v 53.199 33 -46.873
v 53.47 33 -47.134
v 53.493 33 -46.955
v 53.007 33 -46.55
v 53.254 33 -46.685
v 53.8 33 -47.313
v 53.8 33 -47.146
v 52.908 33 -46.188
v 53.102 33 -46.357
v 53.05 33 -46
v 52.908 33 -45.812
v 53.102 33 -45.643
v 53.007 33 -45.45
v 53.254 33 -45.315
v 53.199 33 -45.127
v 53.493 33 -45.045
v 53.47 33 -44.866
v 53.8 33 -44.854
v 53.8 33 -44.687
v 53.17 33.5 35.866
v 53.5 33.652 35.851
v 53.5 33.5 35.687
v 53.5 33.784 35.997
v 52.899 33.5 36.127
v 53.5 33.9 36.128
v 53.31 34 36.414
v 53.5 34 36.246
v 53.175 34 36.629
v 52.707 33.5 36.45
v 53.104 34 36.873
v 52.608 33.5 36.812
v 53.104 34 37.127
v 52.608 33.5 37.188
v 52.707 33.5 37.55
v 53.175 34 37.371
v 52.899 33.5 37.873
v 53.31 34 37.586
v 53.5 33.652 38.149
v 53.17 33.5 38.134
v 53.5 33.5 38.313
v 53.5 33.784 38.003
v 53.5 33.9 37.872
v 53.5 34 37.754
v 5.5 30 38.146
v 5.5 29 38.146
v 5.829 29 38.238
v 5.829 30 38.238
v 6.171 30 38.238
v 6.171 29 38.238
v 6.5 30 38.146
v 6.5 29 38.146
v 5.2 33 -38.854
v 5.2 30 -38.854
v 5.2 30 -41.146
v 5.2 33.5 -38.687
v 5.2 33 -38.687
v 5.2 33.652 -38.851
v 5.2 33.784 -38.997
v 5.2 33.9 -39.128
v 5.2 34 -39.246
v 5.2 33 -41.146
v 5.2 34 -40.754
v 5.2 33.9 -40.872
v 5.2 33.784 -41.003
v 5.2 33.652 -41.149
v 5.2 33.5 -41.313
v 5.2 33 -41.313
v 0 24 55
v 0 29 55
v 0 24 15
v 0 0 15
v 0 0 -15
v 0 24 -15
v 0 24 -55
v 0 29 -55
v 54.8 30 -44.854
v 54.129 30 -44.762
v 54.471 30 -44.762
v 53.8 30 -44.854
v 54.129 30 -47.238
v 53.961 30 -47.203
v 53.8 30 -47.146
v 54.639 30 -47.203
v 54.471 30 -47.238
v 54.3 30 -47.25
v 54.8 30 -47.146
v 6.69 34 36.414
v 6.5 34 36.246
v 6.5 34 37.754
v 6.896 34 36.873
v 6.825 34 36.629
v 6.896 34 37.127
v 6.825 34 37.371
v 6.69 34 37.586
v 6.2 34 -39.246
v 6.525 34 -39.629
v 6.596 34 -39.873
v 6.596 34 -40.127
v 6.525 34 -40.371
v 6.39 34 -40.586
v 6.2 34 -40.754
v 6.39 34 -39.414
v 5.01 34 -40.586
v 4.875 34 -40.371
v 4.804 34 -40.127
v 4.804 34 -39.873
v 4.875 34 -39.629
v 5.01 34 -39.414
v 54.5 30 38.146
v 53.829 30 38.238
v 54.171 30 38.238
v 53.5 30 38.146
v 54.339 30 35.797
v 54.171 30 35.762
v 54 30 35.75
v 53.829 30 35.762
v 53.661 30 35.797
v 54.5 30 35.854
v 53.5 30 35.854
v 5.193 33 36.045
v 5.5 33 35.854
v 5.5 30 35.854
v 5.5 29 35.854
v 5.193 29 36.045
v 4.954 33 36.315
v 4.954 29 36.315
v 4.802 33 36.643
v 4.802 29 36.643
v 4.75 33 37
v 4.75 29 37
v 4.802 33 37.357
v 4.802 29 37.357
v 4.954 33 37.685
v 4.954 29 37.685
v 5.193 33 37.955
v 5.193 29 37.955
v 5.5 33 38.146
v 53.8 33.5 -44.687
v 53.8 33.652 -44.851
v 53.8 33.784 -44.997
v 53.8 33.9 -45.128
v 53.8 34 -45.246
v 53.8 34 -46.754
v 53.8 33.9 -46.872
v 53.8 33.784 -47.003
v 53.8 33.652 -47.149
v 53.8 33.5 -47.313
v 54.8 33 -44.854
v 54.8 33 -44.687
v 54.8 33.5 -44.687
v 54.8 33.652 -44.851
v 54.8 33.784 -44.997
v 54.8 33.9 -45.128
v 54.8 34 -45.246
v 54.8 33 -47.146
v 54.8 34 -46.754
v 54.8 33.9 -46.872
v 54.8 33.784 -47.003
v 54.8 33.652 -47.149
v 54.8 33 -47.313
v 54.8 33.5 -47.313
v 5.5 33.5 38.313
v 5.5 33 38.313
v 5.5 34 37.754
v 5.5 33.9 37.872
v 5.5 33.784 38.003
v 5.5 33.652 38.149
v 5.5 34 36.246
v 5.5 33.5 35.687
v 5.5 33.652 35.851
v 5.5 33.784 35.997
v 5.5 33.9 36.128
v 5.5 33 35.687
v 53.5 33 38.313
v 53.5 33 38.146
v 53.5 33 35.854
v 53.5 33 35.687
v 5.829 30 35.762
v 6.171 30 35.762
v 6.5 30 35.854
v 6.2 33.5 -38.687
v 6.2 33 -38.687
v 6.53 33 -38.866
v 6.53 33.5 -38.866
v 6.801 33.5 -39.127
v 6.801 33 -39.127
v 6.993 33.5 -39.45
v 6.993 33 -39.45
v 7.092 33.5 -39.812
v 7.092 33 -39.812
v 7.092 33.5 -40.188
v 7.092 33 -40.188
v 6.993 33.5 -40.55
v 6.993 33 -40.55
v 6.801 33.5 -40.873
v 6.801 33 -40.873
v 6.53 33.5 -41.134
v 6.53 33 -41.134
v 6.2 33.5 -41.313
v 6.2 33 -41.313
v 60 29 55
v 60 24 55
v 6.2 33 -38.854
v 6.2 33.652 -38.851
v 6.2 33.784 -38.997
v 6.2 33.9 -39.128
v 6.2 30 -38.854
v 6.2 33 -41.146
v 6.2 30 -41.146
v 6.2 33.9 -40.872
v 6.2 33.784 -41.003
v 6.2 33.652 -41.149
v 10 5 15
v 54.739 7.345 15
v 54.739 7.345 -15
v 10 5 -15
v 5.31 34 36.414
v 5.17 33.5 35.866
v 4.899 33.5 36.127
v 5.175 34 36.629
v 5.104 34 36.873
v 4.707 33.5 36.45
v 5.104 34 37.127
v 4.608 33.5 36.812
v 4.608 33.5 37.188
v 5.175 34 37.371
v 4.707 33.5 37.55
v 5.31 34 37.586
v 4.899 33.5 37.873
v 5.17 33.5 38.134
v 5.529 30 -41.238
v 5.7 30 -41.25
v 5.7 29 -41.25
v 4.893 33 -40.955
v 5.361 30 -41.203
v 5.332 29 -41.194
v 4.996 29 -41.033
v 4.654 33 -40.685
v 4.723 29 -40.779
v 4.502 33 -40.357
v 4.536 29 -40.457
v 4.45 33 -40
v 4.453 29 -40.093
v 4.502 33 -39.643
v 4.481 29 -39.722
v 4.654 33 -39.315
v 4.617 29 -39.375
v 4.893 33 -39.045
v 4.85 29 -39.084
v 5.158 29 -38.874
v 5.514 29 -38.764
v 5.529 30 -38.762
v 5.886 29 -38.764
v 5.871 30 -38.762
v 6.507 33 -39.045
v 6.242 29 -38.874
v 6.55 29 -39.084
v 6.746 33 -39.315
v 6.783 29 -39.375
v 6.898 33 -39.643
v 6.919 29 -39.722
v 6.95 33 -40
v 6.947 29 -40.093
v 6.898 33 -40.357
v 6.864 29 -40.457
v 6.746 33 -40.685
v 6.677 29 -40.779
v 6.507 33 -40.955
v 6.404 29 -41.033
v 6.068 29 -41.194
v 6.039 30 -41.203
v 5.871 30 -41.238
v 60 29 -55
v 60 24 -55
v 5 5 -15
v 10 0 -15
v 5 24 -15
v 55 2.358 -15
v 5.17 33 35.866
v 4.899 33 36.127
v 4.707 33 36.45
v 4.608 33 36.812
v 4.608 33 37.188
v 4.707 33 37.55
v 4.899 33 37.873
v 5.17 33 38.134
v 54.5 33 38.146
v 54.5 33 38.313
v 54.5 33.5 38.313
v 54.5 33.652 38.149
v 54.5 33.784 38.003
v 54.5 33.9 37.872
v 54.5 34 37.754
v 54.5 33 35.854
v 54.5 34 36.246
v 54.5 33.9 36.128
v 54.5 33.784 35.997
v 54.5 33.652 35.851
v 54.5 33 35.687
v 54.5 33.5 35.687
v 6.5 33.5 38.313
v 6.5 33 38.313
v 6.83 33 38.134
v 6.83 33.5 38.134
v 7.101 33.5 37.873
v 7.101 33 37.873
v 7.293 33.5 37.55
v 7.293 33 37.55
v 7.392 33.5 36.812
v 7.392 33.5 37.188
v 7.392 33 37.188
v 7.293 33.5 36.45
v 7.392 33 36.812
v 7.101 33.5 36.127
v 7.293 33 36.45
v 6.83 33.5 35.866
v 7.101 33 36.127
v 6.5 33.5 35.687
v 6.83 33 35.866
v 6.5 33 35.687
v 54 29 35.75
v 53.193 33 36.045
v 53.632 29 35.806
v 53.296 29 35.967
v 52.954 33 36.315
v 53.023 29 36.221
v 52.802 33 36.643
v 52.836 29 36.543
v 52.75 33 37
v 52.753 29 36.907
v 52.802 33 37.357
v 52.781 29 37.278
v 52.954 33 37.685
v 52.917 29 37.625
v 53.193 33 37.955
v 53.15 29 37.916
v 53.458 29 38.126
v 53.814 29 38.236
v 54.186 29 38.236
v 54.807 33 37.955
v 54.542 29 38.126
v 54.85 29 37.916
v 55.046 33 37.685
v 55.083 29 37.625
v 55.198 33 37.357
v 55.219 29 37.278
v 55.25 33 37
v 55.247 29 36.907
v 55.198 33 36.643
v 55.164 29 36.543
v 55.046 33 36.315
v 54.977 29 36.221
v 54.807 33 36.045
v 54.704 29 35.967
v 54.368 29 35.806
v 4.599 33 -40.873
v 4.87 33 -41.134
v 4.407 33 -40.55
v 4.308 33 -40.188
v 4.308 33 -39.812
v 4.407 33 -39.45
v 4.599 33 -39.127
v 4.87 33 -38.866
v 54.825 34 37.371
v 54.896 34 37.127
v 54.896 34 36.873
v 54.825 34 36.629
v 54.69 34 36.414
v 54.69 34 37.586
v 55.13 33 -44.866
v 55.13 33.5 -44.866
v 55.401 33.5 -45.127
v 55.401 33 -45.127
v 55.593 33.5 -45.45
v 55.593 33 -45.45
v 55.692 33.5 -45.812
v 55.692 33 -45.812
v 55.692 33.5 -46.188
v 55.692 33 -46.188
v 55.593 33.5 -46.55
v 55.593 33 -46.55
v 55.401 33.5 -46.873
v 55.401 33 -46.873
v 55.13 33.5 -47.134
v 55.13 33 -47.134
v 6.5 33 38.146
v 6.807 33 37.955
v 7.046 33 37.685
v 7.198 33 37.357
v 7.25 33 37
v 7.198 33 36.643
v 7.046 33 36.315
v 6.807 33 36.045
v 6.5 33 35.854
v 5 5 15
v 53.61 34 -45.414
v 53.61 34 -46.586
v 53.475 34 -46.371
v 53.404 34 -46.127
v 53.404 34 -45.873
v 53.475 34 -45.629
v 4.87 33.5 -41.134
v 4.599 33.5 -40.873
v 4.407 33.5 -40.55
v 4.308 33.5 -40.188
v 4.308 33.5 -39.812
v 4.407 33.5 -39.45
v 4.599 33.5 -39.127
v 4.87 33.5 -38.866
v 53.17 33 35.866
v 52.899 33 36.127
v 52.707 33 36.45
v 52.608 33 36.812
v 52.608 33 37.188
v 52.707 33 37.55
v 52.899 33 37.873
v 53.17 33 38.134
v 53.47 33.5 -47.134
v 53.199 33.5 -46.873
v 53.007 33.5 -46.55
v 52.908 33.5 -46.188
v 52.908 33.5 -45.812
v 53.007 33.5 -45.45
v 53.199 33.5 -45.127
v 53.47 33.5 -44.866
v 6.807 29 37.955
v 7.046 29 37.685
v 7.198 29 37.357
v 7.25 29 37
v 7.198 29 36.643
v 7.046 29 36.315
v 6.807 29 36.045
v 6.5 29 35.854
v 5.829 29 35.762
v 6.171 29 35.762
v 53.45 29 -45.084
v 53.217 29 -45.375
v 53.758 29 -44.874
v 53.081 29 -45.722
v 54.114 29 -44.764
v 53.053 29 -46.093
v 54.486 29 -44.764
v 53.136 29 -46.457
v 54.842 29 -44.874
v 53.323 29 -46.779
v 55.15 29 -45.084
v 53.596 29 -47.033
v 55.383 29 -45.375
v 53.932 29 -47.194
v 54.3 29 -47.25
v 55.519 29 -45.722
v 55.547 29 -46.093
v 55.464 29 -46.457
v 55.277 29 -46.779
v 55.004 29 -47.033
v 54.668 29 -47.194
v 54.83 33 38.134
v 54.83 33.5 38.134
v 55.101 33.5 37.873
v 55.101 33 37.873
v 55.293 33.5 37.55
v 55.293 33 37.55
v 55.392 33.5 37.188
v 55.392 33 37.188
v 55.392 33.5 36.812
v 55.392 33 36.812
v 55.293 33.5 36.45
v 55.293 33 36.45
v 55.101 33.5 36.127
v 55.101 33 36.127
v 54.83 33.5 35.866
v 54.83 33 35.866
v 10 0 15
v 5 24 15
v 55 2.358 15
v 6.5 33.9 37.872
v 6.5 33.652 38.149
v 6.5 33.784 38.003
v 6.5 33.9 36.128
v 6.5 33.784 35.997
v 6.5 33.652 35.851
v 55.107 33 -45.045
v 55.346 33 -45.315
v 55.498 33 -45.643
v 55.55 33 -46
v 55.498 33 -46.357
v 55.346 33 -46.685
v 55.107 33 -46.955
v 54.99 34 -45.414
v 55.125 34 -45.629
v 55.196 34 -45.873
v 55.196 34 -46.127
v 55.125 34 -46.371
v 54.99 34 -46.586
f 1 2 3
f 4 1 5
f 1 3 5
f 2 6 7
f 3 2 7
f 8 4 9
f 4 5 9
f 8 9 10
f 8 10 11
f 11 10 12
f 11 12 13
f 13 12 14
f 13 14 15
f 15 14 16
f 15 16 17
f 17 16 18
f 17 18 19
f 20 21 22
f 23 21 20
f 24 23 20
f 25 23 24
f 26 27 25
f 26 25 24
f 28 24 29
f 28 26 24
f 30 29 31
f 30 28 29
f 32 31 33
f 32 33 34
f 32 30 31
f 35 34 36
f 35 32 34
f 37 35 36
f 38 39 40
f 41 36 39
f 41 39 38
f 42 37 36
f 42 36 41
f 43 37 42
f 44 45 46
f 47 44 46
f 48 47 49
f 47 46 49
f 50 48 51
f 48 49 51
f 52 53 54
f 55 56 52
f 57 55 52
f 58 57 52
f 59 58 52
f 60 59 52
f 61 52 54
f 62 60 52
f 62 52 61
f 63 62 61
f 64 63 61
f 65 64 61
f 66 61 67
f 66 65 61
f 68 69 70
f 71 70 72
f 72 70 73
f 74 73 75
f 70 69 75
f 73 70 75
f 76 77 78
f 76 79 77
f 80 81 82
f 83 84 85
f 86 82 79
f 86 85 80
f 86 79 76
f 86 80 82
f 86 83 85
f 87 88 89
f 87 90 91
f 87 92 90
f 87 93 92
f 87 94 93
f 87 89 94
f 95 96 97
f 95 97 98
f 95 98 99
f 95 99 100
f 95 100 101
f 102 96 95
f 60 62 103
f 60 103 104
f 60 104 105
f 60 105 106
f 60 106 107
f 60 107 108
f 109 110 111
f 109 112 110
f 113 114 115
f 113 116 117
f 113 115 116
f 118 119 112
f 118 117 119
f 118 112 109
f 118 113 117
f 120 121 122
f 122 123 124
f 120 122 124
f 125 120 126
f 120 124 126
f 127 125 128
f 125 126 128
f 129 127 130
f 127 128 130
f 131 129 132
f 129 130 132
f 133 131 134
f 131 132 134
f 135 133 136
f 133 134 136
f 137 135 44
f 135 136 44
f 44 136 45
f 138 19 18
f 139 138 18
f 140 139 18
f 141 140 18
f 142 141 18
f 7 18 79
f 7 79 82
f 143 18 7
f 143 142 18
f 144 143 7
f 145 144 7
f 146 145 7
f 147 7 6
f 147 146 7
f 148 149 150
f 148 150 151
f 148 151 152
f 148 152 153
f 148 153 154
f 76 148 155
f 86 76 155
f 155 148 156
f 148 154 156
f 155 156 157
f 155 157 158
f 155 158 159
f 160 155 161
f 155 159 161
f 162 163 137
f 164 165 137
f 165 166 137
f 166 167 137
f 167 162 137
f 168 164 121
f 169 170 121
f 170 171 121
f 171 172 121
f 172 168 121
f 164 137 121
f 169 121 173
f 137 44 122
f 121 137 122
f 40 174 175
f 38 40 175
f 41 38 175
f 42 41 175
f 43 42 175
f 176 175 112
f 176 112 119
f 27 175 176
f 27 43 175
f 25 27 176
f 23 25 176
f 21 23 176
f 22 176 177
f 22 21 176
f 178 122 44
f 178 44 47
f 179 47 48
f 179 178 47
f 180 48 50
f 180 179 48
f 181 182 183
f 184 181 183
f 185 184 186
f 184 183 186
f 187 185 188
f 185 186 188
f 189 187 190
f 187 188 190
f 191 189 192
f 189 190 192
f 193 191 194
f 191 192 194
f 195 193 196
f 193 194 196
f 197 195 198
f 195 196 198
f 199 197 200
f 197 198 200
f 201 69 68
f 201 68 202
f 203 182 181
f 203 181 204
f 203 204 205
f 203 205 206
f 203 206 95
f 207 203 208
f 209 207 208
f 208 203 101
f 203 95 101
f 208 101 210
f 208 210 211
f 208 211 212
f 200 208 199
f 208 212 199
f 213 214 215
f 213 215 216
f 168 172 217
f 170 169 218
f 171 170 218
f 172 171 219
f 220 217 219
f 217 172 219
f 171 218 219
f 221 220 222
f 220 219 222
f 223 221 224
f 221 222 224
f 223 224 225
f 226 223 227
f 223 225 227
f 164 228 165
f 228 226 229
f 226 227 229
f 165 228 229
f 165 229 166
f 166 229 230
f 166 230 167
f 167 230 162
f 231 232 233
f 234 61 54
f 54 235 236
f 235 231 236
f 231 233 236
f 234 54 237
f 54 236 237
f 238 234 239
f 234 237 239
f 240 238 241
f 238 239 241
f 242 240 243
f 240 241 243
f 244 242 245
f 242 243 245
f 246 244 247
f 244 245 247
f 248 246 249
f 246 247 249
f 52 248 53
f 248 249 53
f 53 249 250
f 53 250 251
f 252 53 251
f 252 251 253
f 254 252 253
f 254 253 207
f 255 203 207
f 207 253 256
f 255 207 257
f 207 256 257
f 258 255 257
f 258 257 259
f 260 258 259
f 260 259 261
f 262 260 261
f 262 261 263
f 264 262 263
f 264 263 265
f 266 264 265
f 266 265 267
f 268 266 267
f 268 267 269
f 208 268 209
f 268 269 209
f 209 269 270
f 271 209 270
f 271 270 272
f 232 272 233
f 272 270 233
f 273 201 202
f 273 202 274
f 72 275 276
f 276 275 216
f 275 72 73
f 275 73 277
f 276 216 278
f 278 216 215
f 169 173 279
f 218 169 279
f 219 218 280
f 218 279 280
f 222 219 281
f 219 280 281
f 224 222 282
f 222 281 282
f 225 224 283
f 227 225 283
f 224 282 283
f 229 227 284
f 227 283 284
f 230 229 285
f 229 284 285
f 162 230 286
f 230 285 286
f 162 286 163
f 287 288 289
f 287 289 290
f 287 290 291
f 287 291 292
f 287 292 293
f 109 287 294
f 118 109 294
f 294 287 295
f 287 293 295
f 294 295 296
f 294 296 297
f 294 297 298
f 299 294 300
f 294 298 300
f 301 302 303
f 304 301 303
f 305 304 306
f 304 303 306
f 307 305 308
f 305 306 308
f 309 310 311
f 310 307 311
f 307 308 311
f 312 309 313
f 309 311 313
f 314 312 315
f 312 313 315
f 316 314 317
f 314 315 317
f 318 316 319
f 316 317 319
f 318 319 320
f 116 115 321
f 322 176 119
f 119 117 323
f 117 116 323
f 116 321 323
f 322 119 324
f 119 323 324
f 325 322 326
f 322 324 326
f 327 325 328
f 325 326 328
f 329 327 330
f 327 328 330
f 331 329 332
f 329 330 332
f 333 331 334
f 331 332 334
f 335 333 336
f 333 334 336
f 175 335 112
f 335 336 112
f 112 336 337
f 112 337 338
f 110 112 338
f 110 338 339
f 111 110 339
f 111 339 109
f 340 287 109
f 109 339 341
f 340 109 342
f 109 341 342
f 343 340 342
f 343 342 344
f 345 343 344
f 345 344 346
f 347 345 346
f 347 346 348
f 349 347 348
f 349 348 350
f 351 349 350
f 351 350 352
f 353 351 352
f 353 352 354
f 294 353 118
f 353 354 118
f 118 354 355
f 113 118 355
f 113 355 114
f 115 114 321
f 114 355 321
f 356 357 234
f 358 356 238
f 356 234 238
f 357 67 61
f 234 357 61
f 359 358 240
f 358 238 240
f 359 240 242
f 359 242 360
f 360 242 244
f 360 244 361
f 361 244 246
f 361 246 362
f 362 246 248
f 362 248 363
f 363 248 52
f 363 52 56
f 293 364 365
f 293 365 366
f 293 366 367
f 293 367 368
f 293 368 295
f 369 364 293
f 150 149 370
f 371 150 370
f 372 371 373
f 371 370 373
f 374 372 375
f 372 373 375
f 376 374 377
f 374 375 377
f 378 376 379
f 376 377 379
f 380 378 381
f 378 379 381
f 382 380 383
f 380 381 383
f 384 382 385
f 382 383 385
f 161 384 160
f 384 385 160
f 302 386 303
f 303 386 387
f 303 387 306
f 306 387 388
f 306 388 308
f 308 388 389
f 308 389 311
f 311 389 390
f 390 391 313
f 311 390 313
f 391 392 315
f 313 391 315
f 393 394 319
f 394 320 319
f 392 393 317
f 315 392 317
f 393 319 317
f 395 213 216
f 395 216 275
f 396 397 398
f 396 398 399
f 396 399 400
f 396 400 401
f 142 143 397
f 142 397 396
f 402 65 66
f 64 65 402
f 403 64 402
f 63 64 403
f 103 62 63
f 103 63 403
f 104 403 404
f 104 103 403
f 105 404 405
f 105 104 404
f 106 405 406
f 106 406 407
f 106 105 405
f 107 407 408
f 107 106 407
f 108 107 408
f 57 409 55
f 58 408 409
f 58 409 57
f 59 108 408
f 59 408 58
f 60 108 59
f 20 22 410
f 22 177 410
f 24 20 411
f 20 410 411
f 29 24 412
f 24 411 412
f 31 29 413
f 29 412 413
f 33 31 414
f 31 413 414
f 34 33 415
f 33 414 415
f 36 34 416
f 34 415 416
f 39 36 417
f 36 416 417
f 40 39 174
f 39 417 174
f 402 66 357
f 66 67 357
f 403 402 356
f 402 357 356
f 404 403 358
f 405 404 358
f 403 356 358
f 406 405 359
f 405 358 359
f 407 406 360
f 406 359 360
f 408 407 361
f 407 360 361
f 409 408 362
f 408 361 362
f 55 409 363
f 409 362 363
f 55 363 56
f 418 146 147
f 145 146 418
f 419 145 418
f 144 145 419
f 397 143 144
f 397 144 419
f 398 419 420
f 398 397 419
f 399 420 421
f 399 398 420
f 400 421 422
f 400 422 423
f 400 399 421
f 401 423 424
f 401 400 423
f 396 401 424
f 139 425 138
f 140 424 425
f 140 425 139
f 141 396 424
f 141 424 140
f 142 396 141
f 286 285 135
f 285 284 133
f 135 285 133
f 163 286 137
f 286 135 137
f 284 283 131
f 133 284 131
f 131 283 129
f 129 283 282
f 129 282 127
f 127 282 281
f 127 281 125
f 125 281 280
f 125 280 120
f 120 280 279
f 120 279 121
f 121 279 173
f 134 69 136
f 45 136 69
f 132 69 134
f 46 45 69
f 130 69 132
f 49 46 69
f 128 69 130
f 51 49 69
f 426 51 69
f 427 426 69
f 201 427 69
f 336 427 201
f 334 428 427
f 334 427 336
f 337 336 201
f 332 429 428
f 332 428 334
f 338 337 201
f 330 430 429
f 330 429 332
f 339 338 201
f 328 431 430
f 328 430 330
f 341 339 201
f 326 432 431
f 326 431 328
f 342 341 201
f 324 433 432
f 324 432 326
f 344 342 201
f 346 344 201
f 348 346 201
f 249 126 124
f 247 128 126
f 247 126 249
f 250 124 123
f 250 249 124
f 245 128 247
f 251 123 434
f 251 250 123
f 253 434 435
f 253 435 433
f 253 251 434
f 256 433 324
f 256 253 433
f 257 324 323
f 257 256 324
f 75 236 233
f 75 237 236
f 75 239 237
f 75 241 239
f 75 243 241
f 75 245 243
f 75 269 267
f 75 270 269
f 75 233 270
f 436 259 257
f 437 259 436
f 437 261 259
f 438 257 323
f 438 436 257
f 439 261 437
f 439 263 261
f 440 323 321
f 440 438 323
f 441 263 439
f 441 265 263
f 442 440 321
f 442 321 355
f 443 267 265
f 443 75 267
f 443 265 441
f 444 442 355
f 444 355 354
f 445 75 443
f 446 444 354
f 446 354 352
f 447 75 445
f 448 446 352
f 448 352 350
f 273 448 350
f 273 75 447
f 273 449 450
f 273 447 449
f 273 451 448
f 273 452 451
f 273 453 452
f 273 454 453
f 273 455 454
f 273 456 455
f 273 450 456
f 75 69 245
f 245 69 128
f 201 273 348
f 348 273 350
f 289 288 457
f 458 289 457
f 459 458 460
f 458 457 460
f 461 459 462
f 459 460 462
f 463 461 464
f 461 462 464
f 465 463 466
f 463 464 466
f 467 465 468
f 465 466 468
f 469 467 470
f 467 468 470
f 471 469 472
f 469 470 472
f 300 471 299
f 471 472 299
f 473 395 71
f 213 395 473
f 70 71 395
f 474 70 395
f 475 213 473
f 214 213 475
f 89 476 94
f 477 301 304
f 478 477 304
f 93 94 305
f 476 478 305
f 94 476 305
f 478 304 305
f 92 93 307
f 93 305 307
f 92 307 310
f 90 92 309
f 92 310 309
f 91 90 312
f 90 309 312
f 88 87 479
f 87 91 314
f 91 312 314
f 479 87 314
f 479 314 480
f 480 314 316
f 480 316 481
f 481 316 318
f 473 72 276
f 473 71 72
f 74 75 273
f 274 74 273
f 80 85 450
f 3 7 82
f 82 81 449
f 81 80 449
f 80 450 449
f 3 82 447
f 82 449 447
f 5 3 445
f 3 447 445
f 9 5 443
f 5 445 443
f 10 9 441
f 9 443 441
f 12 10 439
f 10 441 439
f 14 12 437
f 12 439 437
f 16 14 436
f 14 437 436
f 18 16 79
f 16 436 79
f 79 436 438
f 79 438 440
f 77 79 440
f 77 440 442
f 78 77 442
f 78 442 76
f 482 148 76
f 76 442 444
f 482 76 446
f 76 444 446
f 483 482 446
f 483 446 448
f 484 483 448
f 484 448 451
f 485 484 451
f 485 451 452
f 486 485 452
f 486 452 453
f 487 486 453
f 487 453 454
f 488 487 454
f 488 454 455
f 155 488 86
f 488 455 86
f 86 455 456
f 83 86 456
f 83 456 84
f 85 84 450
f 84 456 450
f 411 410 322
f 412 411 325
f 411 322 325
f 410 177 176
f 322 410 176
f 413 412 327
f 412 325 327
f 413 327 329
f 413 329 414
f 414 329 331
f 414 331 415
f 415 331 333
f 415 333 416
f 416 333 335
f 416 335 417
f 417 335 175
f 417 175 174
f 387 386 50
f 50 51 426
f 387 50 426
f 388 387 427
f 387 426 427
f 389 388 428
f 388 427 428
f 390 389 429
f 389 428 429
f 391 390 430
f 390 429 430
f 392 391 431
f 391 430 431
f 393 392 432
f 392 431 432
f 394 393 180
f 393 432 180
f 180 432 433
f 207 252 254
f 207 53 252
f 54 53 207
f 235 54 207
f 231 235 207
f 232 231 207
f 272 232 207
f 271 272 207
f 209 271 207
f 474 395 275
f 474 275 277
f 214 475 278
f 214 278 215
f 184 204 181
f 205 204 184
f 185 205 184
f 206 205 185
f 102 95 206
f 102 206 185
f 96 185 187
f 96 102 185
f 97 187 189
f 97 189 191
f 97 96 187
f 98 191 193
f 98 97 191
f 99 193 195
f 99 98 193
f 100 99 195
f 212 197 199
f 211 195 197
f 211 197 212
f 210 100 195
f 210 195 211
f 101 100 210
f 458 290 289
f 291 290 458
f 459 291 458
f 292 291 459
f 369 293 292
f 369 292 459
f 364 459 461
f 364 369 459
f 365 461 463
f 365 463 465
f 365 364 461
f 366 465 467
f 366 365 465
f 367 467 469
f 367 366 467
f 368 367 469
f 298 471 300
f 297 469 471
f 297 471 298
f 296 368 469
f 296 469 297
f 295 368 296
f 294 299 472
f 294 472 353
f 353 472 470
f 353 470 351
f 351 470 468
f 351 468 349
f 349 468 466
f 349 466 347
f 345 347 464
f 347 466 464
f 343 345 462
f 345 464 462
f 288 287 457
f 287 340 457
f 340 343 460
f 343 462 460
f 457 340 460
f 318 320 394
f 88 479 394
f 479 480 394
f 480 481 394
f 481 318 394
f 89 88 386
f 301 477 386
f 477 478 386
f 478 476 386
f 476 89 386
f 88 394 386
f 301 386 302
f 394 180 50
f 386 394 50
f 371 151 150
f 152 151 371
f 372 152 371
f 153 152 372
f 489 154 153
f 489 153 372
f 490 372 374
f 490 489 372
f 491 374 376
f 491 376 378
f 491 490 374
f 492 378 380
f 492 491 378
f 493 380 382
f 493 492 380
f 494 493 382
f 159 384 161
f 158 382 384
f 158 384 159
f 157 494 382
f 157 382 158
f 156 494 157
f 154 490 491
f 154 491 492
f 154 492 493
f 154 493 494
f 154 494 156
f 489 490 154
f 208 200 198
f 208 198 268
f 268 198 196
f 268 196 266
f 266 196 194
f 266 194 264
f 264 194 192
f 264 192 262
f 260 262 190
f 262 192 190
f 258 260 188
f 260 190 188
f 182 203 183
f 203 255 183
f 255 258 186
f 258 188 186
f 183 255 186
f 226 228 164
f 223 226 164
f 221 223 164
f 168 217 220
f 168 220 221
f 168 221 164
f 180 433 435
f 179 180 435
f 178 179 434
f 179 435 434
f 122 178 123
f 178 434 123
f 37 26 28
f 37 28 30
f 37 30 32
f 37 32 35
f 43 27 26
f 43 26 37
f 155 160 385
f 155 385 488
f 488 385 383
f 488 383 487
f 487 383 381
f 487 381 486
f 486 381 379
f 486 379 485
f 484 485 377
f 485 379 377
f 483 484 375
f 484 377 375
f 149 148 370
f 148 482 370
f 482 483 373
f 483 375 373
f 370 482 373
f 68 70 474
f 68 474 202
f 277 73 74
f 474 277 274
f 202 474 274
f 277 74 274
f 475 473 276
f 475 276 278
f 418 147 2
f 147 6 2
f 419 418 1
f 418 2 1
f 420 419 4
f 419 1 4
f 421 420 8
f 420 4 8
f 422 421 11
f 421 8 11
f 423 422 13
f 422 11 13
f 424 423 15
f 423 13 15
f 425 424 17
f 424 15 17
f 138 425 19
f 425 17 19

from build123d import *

# Parameters (mm, degrees)
BOSS_EXTRUDE1_DEPTH = 15
SKETCH2_W           = 60
SKETCH2_H           = 110
BOSS_EXTRUDE2_DEPTH = 5
SKETCH3_R           = 1.25
BOSS_EXTRUDE3_DEPTH = 4
SKETCH4_R           = 1.405
BOSS_EXTRUDE4_DEPTH = 1
CHAMFER1_SIZE       = 0.5
SKETCH5_W           = 1
SKETCH5_H           = 3.260897444
CUT_EXTRUDE1_DEPTH  = 4
MIRROR1_START       = 28
MIRROR1_DEPTH       = 6
MIRROR1_2_DEPTH     = 2
MIRROR1_START_2     = 33
MIRROR1_3_DEPTH     = 1
SKETCH7_R           = 1.25
BOSS_EXTRUDE5_DEPTH = 4
SKETCH8_R           = 1.405
BOSS_EXTRUDE6_DEPTH = 1
CHAMFER2_SIZE       = 0.5
SKETCH9_W           = 1
SKETCH9_H           = 4.099421272
SKETCH9_H_2         = 4.814063164
CUT_EXTRUDE2_DEPTH  = 4


with BuildPart() as part:
    # Sketch1 → Boss-Extrude1 (new, symmetric)
    with BuildSketch(Plane.XY):
        Polygon((0, 0), (10, 0), (55, 2.358350068), (54.738678842, 7.344654806), (10, 5), (5, 5), (5, 24), (60, 24), (60, 29), (0, 29), align=None)
    extrude(amount=BOSS_EXTRUDE1_DEPTH, both=True)

    # Sketch2 → Boss-Extrude2 (add)
    with BuildSketch(Plane(origin=(0, 29, 0), x_dir=(1, 0, 0), z_dir=(0, 1, 0))):
        with Locations((30, 0)):
            Rectangle(SKETCH2_W, SKETCH2_H)
    extrude(amount=-BOSS_EXTRUDE2_DEPTH)

    # Sketch3 → Boss-Extrude3 (add)
    with BuildSketch(Plane(origin=(0, 29, 0), x_dir=(1, 0, 0), z_dir=(0, 1, 0))):
        with Locations(Location((54, -37, 0), (0, 0, 90))):
            Circle(SKETCH3_R)
    extrude(amount=BOSS_EXTRUDE3_DEPTH)

    # Sketch4 → Boss-Extrude4 (add)
    with BuildSketch(Plane(origin=(0, 33, 0), x_dir=(1, 0, 0), z_dir=(0, 1, 0))):
        with Locations(Location((54, -37, 0), (0, 0, 270))):
            Circle(SKETCH4_R)
    extrude(amount=BOSS_EXTRUDE4_DEPTH)

    # Chamfer1
    chamfer1_edges = [part.edges().sort_by_distance(p)[0] for p in [
        (54, 34, 35.595),
    ]]
    chamfer(chamfer1_edges, length=CHAMFER1_SIZE)

    # Sketch5 → Cut-Extrude1 (cut)
    with BuildSketch(Plane(origin=(0, 34, 0), x_dir=(1, 0, 0), z_dir=(0, 1, 0))):
        with Locations((54, -37)):
            Rectangle(SKETCH5_W, SKETCH5_H)
    extrude(amount=-CUT_EXTRUDE1_DEPTH, mode=Mode.SUBTRACT)

    # Mirror1: read off the stored shape, not the designer's step
    # Mirror1 outline → Mirror1 (add)
    with BuildSketch(Plane(origin=(0, 0, 0), x_dir=(1, 0, 0), z_dir=(0, 1, 0)).offset(MIRROR1_START)):
        with BuildLine():
            ThreePointArc((6.5, -38.145643924), (7.25, -37), (6.5, -35.854356076))
            Line((6.5, -35.854356076), (6.5, -38.145643924))
        make_face()
        with BuildLine():
            Line((5.5, -38.145643924), (5.5, -35.854356076))
            ThreePointArc((5.5, -35.854356076), (4.75, -37), (5.5, -38.145643924))
        make_face()
    extrude(amount=MIRROR1_DEPTH)

    # Mirror1 2 outline → Mirror1 2 (add)
    with BuildSketch(Plane(origin=(0, 0, 0), x_dir=(1, 0, 0), z_dir=(0, 1, 0)).offset(MIRROR1_START)):
        with BuildLine():
            Line((6.5, -38.145643924), (6.5, -35.854356076))
            ThreePointArc((6.5, -35.854356076), (6, -35.75), (5.5, -35.854356076))
            Line((5.5, -35.854356076), (5.5, -38.145643924))
            ThreePointArc((5.5, -38.145643924), (6, -38.25), (6.5, -38.145643924))
        make_face()
    extrude(amount=MIRROR1_2_DEPTH)

    # Mirror1 3 outline → Mirror1 3 (add)
    with BuildSketch(Plane(origin=(0, 0, 0), x_dir=(1, 0, 0), z_dir=(0, 1, 0)).offset(MIRROR1_START_2)):
        with BuildLine():
            ThreePointArc((6.5, -35.854356076), (7.25, -37), (6.5, -38.145643924))
            Line((6.5, -38.145643924), (6.5, -38.313021325))
            ThreePointArc((6.5, -38.313021325), (7.405, -37), (6.5, -35.686978675))
            Line((6.5, -35.686978675), (6.5, -35.854356076))
        make_face()
        with BuildLine():
            ThreePointArc((5.5, -38.145643924), (4.75, -37), (5.5, -35.854356076))
            Line((5.5, -35.854356076), (5.5, -35.686978675))
            ThreePointArc((5.5, -35.686978675), (4.595, -37), (5.5, -38.313021325))
            Line((5.5, -38.313021325), (5.5, -38.145643924))
        make_face()
    extrude(amount=MIRROR1_3_DEPTH)

    # Mirror1 4 outline → Mirror1 4 (revolve, cut)
    with BuildSketch(Plane(origin=(6, 0, 37), x_dir=(1, 0, 0), z_dir=(0, 0, 1))):
        Polygon((1.405000007, 34.00000007), (0.90499993, 34.00000007), (1.405000007, 33.499999993), align=None)
    revolve(axis=Axis((6, 0, 37), (0, 1, 0)), mode=Mode.SUBTRACT)

    # Sketch7 → Boss-Extrude5 (add)
    with BuildSketch(Plane(origin=(0, 29, 0), x_dir=(1, 0, 0), z_dir=(0, 1, 0))):
        with Locations(Location((54.3, 46, 0), (0, 0, 90))):
            Circle(SKETCH7_R)
        with Locations(Location((5.7, 40, 0), (0, 0, 90))):
            Circle(SKETCH7_R)
    extrude(amount=BOSS_EXTRUDE5_DEPTH)

    # Sketch8 → Boss-Extrude6 (add)
    with BuildSketch(Plane(origin=(0, 33, 0), x_dir=(1, 0, 0), z_dir=(0, 1, 0))):
        with Locations(Location((5.7, 40, 0), (0, 0, 270))):
            Circle(SKETCH8_R)
        with Locations(Location((54.3, 46, 0), (0, 0, 270))):
            Circle(SKETCH8_R)
    extrude(amount=BOSS_EXTRUDE6_DEPTH)

    # Chamfer2
    chamfer2_edges = [part.edges().sort_by_distance(p)[0] for p in [
        (5.7, 34, -41.405),
        (54.3, 34, -47.405),
    ]]
    chamfer(chamfer2_edges, length=CHAMFER2_SIZE)

    # Sketch9 → Cut-Extrude2 (cut)
    with BuildSketch(Plane(origin=(0, 34, 0), x_dir=(1, 0, 0), z_dir=(0, 1, 0))):
        with Locations((5.7, 40)):
            Rectangle(SKETCH9_W, SKETCH9_H)
        with Locations((54.3, 46)):
            Rectangle(SKETCH9_W, SKETCH9_H_2)
    extrude(amount=-CUT_EXTRUDE2_DEPTH, mode=Mode.SUBTRACT)


solid = part.part
